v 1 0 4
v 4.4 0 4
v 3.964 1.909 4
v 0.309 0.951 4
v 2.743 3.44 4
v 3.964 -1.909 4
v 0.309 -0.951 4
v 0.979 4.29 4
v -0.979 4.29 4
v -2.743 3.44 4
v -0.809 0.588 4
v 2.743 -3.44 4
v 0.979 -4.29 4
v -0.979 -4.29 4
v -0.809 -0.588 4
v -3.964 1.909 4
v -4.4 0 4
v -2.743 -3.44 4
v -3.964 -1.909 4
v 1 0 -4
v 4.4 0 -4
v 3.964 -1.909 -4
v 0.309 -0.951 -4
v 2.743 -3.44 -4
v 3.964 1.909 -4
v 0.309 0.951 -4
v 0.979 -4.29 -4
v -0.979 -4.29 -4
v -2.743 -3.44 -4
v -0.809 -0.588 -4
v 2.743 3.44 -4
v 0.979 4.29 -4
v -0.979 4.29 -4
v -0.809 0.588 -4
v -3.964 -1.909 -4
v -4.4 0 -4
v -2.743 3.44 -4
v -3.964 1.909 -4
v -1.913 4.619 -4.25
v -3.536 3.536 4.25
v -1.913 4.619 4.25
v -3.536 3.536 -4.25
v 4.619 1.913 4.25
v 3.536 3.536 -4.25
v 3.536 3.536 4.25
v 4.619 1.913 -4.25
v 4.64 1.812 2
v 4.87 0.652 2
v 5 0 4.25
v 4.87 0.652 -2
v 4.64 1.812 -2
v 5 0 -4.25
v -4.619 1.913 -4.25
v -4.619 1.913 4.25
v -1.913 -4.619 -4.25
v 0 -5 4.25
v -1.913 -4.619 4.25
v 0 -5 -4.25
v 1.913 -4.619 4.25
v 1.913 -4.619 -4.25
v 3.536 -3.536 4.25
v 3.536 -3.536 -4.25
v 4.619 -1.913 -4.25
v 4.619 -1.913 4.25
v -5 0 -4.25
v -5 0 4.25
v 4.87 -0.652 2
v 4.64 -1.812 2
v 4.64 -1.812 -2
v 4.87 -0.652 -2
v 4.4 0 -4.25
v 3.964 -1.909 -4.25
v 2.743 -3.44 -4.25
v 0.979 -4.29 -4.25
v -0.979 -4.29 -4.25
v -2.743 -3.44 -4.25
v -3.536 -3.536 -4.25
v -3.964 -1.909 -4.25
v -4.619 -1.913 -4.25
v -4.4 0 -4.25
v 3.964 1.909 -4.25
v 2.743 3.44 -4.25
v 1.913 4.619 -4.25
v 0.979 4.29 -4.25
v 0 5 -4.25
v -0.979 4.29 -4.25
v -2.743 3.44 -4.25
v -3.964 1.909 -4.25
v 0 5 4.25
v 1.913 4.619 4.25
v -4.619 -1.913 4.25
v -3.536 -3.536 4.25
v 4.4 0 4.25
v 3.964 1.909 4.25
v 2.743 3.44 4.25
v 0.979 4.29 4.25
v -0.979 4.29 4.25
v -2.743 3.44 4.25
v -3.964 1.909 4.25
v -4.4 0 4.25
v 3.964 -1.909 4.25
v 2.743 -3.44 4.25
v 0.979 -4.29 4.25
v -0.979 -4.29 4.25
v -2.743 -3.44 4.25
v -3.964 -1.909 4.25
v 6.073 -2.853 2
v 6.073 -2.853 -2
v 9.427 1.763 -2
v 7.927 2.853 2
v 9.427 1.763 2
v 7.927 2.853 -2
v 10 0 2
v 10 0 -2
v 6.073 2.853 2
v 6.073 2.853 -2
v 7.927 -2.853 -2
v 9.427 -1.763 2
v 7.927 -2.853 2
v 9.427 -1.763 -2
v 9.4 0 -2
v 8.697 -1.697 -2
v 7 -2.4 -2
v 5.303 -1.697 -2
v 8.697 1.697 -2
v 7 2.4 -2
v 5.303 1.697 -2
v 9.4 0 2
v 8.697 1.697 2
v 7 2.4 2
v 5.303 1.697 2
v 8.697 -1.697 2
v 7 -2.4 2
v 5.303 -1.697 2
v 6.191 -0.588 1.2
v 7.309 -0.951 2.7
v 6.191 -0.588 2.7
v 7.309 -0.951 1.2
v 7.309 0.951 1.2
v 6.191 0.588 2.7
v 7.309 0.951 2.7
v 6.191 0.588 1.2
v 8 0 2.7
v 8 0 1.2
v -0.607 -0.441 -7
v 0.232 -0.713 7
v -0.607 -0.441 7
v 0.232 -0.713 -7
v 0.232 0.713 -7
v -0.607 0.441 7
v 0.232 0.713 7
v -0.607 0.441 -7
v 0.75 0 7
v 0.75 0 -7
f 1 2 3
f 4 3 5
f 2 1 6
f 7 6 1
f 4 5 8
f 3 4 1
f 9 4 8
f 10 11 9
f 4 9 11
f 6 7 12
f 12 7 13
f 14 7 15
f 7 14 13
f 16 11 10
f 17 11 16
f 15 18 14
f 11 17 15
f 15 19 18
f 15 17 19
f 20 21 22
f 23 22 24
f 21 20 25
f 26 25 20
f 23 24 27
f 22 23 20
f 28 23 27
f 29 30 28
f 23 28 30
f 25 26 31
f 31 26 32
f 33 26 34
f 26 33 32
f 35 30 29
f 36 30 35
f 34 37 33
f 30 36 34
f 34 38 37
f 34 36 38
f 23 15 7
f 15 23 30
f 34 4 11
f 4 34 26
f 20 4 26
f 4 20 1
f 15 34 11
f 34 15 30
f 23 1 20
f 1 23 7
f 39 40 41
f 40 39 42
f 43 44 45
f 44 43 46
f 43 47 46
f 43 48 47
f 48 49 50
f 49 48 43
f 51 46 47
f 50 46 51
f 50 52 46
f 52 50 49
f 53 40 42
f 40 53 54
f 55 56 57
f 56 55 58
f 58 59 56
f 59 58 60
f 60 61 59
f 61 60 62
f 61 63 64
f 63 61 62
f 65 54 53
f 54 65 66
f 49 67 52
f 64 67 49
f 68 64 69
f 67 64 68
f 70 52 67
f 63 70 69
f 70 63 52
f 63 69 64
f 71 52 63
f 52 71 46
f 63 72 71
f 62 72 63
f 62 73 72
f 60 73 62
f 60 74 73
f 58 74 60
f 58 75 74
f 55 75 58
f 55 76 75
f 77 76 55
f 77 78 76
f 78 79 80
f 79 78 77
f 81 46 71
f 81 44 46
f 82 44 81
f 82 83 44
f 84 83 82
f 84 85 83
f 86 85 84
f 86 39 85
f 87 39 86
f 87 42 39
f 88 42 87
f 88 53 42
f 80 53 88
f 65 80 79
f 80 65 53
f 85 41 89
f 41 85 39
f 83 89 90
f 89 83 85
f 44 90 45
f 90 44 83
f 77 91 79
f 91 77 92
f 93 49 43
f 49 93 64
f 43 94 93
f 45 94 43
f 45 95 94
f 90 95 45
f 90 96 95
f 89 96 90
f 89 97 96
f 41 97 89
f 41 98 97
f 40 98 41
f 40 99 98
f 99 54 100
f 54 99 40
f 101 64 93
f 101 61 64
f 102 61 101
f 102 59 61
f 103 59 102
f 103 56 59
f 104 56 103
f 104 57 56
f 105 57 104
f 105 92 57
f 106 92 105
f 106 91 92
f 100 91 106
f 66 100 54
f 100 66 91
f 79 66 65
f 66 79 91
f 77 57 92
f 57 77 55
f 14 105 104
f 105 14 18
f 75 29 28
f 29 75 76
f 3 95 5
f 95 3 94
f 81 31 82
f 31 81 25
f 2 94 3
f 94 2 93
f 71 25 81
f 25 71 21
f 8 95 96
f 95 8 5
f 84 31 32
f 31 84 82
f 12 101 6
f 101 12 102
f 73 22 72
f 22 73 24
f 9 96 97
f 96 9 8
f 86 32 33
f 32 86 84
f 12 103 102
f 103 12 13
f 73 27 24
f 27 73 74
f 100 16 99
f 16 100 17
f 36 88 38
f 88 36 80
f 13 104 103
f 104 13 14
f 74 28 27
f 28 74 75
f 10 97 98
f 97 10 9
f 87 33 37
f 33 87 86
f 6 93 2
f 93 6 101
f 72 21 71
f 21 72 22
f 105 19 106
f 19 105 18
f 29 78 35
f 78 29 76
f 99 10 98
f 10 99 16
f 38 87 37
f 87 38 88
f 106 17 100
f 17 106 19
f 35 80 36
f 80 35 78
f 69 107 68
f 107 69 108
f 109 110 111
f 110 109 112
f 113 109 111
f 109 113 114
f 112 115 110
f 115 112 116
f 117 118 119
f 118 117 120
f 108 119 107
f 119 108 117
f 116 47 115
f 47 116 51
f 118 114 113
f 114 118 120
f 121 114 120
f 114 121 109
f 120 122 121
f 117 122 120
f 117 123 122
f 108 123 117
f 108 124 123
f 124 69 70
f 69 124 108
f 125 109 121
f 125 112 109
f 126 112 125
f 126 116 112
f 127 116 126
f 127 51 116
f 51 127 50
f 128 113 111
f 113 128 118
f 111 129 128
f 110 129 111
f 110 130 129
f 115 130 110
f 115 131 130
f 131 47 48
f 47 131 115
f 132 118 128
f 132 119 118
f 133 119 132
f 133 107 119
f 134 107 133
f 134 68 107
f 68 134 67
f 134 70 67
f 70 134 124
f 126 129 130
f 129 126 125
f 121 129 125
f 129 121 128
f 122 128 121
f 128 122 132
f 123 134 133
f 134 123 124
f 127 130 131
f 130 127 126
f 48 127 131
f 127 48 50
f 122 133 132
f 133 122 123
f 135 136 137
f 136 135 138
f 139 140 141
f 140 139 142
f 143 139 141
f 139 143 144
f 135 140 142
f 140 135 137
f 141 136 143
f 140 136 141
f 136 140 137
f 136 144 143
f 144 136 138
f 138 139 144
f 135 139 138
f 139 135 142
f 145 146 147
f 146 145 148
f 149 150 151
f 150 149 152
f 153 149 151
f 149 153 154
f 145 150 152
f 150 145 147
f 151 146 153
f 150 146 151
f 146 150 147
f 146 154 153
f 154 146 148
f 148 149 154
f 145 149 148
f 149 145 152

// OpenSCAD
// Parameters
stator_diameter_mm = 9.0; //[4.5:18.0:0.1]
stator_height_mm = 8.0; //[4.0:16.0:0.1]
stator_bore_diameter_mm = 2.0; //[1.0:4.0:0.1]
rotor_outer_diameter_mm = 10.0; //[5.0:20.0:0.1]
rotor_height_mm = 8.5; //[4.25:17.0:0.1]
shaft_diameter_mm = 1.5; //[0.75:3.0:0.05]
shaft_length_mm = 14.0; //[7.0:28.0:0.1]
clearance_mm = 0.2; //[0.0:1.0:0.05]
overlap_mm = 0.8; //[0.2:2.0:0.1]
rotor_wall_mm = 0.6; //[0.3:1.5:0.05]
buzzer_diameter_mm = 6.0; //[3.0:12.0:0.1]
buzzer_height_mm = 4.0; //[2.0:8.0:0.1]
buzzer_pin_diameter_mm = 2.0; //[1.0:3.0:0.1]
buzzer_pin_height_mm = 1.5; //[0.5:4.0:0.1]
buzzer_offset_x_mm = 7.0; //[3.5:14.0:0.1]

// Buzzer - complete geometry
module buzzer() {
  color([0.1, 0.1, 0.6]) {
    // Buzzer shell
    difference() {
      translate([buzzer_offset_x_mm, 0, 0])
        cylinder(r=buzzer_diameter_mm/2, h=buzzer_height_mm, center=true);
      translate([buzzer_offset_x_mm, 0, 0])
        cylinder(r=buzzer_diameter_mm/2 - rotor_wall_mm, h=buzzer_height_mm + 2*overlap_mm, center=true);
    }
    // Buzzer pin
    translate([buzzer_offset_x_mm, 0, buzzer_height_mm/2 + buzzer_pin_height_mm/2 - overlap_mm])
      cylinder(r=buzzer_pin_diameter_mm/2, h=buzzer_pin_height_mm, center=true);
  }
}

// Motor assembly
module assembly() {
  // Stator
  color("DimGray") {
    difference() {
      cylinder(r=stator_diameter_mm/2, h=stator_height_mm, center=true);
      cylinder(r=stator_bore_diameter_mm/2, h=stator_height_mm + 2*overlap_mm, center=true);
    }
  }
  
  // Rotor
  color("Black") {
    difference() {
      cylinder(r=rotor_outer_diameter_mm/2, h=rotor_height_mm, center=true);
      cylinder(r=rotor_outer_diameter_mm/2 - rotor_wall_mm, h=rotor_height_mm + 2*overlap_mm, center=true);
    }
  }
  
  // Central Shaft
  color("Silver") {
    cylinder(r=shaft_diameter_mm/2, h=shaft_length_mm, center=true);
  }
  
  // Buzzer
  buzzer();
}

// Final assembly
assembly();
